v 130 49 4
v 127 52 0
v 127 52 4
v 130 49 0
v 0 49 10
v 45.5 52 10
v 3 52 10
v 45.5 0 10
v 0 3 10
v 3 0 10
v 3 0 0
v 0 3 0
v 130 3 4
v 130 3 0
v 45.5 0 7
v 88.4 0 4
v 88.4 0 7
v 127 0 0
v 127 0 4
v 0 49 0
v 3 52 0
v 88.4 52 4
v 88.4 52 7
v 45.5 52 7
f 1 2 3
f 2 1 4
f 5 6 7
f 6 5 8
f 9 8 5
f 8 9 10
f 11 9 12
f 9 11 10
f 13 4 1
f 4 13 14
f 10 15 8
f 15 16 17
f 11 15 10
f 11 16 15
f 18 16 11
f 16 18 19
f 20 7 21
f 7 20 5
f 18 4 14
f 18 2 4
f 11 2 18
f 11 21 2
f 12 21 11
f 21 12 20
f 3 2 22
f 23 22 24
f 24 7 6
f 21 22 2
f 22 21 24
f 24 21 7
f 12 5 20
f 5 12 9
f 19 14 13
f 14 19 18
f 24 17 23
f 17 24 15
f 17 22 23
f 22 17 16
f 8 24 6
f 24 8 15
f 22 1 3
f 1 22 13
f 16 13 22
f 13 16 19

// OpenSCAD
$fn = 32;

// ----------------------------------------------------------------------
// Stepped bar: twostep, 130 x 52 x 10/4 mm
// ----------------------------------------------------------------------

// --- parameters (mm) ---
bar_l = 130;              // bar length, X
bar_w = 52;               // bar width, Y
plate_t = 10;             // thickness of the thick zone, Z
thin_t = 4;               // thickness of the thin zone
corner_c = 3;             // corner chamfer of the bar
step_cut = 6;             // material removed from the thin zone
stair1_x = 45.5;          // position of the first stair
stair2_x = 88.4;          // position of the second stair
mid_t = 7;                // thickness of the middle zone
depth_1 = 3;              // depth of cut 1 from the top face
depth_2 = 6;              // depth of cut 2 from the top face

profile = [[3, 0], [127, 0], [130, 3], [130, 49], [127, 52], [3, 52], [0, 49], [0, 3]];  // primary outline, 8 points, counter clockwise
void_1 = [[45.5, -1], [88.4, -1], [88.4, 53], [45.5, 53]];  // first stair, 4 points
void_2 = [[88.4, -1], [131, -1], [131, 53], [88.4, 53]];  // second stair, 4 points

// --- the one profile operation ---
difference() {
  linear_extrude(height = plate_t) polygon(points = profile);
  translate([0, 0, plate_t - depth_1])
    linear_extrude(height = depth_1 + 1) polygon(points = void_1);
  translate([0, 0, plate_t - depth_2])
    linear_extrude(height = depth_2 + 1) polygon(points = void_2);
}
